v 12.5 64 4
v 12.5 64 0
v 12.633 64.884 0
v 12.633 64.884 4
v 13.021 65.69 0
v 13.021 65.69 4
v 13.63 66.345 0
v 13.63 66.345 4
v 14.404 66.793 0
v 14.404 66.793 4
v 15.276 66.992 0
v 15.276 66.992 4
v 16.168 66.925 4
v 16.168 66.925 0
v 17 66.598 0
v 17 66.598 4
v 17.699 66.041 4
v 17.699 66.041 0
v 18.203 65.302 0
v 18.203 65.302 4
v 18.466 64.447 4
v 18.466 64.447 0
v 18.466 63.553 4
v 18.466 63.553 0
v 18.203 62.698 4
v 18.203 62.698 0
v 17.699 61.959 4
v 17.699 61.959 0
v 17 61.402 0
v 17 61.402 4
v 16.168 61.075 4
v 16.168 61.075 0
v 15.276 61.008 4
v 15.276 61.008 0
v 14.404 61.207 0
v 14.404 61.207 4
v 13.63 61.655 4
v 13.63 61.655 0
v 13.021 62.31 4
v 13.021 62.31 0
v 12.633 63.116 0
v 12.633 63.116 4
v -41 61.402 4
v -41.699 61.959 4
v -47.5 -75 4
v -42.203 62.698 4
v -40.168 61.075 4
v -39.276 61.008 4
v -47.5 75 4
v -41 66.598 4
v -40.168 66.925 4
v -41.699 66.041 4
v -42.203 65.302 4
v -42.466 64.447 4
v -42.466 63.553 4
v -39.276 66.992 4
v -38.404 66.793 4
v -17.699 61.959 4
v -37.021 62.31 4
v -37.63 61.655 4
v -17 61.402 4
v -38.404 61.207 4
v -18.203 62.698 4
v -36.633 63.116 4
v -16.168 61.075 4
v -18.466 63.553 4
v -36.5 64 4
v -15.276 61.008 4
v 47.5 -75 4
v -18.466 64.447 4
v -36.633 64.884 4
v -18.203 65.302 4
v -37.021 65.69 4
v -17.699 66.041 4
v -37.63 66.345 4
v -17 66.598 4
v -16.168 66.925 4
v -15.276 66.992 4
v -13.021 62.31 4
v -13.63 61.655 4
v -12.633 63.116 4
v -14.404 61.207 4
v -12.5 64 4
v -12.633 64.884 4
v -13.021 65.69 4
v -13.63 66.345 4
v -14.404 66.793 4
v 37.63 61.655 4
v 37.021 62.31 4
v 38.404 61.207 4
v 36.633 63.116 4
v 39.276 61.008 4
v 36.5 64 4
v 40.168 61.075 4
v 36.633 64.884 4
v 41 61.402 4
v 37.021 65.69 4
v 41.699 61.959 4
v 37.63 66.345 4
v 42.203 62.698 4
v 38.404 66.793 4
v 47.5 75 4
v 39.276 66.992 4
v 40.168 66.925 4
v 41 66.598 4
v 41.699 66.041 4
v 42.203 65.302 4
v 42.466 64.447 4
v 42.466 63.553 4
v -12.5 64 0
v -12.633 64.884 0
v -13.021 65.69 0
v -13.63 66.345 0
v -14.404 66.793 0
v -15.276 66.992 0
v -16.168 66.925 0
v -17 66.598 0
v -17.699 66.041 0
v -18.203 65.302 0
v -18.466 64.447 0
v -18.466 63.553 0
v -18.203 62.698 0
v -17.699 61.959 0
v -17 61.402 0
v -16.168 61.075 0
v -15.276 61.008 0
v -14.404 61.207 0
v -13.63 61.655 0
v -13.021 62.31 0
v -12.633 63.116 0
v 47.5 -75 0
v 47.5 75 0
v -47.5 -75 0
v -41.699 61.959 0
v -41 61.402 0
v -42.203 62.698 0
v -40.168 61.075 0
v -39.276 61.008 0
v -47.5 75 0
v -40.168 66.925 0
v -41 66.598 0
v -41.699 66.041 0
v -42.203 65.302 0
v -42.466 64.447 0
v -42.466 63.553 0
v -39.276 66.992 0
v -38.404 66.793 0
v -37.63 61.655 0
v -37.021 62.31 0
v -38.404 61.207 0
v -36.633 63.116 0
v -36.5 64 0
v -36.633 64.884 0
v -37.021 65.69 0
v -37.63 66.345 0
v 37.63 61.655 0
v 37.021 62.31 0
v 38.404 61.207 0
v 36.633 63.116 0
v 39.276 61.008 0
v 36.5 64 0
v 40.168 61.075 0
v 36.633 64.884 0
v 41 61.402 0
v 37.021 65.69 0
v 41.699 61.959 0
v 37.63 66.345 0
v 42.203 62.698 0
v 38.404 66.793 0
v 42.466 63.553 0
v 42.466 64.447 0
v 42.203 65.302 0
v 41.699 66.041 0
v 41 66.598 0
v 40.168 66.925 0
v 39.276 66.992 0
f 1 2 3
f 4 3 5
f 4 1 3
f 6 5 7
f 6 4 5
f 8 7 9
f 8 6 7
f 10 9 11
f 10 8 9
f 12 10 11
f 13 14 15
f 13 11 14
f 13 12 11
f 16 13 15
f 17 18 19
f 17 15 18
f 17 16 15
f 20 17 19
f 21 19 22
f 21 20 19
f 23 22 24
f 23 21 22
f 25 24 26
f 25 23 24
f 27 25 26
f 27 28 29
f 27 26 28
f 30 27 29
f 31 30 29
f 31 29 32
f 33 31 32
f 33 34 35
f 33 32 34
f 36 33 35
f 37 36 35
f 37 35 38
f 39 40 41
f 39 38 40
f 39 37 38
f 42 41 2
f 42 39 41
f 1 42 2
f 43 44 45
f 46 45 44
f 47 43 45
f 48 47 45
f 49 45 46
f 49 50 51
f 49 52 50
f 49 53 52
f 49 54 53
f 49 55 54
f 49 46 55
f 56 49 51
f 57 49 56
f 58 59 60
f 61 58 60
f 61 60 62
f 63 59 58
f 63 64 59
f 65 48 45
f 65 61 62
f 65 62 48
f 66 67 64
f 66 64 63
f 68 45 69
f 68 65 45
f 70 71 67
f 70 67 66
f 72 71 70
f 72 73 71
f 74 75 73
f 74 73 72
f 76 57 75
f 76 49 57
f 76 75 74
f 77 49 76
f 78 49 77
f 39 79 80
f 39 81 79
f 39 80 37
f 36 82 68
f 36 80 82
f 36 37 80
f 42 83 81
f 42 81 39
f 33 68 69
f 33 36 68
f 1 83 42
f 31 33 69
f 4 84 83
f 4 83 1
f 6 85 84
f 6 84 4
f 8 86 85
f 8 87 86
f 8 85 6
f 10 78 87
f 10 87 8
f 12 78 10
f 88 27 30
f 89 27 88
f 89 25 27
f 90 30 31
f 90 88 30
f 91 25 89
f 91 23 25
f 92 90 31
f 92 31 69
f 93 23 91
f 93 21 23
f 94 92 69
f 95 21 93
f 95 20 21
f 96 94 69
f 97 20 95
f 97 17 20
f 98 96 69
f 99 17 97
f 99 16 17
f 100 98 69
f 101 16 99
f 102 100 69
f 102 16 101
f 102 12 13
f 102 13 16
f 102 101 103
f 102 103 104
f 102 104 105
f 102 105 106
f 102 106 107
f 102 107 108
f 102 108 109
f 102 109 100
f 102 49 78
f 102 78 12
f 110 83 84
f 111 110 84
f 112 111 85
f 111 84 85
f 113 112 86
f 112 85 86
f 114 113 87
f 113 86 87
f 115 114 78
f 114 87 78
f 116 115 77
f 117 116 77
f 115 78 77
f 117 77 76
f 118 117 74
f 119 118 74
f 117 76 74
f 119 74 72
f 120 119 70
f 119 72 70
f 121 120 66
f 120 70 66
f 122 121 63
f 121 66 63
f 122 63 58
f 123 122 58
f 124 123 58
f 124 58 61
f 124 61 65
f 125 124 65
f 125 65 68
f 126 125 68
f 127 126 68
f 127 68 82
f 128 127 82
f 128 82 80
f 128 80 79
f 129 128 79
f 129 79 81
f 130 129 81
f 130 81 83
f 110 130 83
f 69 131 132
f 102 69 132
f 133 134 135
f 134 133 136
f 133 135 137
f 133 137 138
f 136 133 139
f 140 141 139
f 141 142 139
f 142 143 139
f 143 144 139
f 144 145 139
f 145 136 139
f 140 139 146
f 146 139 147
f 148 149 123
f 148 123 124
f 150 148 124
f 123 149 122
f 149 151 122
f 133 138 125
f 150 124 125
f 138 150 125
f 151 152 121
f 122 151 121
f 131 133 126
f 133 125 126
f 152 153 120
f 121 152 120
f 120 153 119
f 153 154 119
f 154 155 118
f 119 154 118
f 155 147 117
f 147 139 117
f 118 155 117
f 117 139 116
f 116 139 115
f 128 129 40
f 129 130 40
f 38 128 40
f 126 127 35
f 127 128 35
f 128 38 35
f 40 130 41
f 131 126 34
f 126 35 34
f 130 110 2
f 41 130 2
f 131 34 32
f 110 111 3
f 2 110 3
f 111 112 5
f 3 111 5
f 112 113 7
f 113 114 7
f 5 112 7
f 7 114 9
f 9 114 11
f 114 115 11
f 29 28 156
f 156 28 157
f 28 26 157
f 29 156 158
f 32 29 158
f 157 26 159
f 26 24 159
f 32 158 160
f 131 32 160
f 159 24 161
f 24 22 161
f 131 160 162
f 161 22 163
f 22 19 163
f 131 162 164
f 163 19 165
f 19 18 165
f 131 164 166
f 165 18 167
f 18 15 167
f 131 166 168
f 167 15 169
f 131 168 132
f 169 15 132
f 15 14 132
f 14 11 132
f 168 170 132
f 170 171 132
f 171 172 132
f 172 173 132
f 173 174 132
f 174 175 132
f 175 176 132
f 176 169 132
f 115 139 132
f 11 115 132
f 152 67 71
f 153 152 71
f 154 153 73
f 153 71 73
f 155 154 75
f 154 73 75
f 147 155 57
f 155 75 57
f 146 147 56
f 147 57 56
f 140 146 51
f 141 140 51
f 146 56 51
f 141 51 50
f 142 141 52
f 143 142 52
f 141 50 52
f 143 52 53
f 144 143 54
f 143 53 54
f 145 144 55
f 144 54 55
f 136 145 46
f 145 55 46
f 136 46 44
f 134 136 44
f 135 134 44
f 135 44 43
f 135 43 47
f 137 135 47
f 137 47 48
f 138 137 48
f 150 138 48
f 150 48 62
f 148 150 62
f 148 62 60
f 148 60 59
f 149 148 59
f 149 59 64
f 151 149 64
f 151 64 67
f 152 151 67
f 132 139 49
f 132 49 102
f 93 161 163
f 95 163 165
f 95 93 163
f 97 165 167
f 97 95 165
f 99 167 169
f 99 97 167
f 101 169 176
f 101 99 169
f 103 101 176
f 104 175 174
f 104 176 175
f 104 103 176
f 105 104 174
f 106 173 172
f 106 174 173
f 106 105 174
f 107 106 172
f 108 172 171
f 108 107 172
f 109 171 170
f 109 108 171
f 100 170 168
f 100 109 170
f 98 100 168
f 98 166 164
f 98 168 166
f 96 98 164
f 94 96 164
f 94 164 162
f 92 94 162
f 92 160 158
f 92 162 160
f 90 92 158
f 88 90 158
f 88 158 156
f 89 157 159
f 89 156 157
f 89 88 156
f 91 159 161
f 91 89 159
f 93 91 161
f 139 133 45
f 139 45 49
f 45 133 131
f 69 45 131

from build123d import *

# Parameters (mm, degrees)
SKETCH_1_W          = 95
SKETCH_1_H          = 150
EXTRUDE_1_DEPTH     = 4
SKETCH_2_R          = 3
CUT_EXTRUDE_1_DEPTH = 89.866472868


with BuildPart() as part:
    # 草图1 → 凸台-拉伸1 (new body)
    with BuildSketch(Plane.XY):
        Rectangle(SKETCH_1_W, SKETCH_1_H)
    extrude(amount=EXTRUDE_1_DEPTH)

    # 草图2 → 切除-拉伸1 (cut, through all)
    with BuildSketch(Plane.XY.offset(4)):
        with Locations((-39.5, 64)):
            Circle(SKETCH_2_R)
        with Locations((-15.5, 64)):
            Circle(SKETCH_2_R)
    cut_extrude_1 = extrude(amount=-CUT_EXTRUDE_1_DEPTH, mode=Mode.SUBTRACT)

    # 镜向1: 切除-拉伸1 across plane
    add(cut_extrude_1.mirror(Plane(origin=(0, 0, 0), x_dir=(0, 0, 1), z_dir=(1, 0, 0))), mode=Mode.SUBTRACT)


solid = part.part
